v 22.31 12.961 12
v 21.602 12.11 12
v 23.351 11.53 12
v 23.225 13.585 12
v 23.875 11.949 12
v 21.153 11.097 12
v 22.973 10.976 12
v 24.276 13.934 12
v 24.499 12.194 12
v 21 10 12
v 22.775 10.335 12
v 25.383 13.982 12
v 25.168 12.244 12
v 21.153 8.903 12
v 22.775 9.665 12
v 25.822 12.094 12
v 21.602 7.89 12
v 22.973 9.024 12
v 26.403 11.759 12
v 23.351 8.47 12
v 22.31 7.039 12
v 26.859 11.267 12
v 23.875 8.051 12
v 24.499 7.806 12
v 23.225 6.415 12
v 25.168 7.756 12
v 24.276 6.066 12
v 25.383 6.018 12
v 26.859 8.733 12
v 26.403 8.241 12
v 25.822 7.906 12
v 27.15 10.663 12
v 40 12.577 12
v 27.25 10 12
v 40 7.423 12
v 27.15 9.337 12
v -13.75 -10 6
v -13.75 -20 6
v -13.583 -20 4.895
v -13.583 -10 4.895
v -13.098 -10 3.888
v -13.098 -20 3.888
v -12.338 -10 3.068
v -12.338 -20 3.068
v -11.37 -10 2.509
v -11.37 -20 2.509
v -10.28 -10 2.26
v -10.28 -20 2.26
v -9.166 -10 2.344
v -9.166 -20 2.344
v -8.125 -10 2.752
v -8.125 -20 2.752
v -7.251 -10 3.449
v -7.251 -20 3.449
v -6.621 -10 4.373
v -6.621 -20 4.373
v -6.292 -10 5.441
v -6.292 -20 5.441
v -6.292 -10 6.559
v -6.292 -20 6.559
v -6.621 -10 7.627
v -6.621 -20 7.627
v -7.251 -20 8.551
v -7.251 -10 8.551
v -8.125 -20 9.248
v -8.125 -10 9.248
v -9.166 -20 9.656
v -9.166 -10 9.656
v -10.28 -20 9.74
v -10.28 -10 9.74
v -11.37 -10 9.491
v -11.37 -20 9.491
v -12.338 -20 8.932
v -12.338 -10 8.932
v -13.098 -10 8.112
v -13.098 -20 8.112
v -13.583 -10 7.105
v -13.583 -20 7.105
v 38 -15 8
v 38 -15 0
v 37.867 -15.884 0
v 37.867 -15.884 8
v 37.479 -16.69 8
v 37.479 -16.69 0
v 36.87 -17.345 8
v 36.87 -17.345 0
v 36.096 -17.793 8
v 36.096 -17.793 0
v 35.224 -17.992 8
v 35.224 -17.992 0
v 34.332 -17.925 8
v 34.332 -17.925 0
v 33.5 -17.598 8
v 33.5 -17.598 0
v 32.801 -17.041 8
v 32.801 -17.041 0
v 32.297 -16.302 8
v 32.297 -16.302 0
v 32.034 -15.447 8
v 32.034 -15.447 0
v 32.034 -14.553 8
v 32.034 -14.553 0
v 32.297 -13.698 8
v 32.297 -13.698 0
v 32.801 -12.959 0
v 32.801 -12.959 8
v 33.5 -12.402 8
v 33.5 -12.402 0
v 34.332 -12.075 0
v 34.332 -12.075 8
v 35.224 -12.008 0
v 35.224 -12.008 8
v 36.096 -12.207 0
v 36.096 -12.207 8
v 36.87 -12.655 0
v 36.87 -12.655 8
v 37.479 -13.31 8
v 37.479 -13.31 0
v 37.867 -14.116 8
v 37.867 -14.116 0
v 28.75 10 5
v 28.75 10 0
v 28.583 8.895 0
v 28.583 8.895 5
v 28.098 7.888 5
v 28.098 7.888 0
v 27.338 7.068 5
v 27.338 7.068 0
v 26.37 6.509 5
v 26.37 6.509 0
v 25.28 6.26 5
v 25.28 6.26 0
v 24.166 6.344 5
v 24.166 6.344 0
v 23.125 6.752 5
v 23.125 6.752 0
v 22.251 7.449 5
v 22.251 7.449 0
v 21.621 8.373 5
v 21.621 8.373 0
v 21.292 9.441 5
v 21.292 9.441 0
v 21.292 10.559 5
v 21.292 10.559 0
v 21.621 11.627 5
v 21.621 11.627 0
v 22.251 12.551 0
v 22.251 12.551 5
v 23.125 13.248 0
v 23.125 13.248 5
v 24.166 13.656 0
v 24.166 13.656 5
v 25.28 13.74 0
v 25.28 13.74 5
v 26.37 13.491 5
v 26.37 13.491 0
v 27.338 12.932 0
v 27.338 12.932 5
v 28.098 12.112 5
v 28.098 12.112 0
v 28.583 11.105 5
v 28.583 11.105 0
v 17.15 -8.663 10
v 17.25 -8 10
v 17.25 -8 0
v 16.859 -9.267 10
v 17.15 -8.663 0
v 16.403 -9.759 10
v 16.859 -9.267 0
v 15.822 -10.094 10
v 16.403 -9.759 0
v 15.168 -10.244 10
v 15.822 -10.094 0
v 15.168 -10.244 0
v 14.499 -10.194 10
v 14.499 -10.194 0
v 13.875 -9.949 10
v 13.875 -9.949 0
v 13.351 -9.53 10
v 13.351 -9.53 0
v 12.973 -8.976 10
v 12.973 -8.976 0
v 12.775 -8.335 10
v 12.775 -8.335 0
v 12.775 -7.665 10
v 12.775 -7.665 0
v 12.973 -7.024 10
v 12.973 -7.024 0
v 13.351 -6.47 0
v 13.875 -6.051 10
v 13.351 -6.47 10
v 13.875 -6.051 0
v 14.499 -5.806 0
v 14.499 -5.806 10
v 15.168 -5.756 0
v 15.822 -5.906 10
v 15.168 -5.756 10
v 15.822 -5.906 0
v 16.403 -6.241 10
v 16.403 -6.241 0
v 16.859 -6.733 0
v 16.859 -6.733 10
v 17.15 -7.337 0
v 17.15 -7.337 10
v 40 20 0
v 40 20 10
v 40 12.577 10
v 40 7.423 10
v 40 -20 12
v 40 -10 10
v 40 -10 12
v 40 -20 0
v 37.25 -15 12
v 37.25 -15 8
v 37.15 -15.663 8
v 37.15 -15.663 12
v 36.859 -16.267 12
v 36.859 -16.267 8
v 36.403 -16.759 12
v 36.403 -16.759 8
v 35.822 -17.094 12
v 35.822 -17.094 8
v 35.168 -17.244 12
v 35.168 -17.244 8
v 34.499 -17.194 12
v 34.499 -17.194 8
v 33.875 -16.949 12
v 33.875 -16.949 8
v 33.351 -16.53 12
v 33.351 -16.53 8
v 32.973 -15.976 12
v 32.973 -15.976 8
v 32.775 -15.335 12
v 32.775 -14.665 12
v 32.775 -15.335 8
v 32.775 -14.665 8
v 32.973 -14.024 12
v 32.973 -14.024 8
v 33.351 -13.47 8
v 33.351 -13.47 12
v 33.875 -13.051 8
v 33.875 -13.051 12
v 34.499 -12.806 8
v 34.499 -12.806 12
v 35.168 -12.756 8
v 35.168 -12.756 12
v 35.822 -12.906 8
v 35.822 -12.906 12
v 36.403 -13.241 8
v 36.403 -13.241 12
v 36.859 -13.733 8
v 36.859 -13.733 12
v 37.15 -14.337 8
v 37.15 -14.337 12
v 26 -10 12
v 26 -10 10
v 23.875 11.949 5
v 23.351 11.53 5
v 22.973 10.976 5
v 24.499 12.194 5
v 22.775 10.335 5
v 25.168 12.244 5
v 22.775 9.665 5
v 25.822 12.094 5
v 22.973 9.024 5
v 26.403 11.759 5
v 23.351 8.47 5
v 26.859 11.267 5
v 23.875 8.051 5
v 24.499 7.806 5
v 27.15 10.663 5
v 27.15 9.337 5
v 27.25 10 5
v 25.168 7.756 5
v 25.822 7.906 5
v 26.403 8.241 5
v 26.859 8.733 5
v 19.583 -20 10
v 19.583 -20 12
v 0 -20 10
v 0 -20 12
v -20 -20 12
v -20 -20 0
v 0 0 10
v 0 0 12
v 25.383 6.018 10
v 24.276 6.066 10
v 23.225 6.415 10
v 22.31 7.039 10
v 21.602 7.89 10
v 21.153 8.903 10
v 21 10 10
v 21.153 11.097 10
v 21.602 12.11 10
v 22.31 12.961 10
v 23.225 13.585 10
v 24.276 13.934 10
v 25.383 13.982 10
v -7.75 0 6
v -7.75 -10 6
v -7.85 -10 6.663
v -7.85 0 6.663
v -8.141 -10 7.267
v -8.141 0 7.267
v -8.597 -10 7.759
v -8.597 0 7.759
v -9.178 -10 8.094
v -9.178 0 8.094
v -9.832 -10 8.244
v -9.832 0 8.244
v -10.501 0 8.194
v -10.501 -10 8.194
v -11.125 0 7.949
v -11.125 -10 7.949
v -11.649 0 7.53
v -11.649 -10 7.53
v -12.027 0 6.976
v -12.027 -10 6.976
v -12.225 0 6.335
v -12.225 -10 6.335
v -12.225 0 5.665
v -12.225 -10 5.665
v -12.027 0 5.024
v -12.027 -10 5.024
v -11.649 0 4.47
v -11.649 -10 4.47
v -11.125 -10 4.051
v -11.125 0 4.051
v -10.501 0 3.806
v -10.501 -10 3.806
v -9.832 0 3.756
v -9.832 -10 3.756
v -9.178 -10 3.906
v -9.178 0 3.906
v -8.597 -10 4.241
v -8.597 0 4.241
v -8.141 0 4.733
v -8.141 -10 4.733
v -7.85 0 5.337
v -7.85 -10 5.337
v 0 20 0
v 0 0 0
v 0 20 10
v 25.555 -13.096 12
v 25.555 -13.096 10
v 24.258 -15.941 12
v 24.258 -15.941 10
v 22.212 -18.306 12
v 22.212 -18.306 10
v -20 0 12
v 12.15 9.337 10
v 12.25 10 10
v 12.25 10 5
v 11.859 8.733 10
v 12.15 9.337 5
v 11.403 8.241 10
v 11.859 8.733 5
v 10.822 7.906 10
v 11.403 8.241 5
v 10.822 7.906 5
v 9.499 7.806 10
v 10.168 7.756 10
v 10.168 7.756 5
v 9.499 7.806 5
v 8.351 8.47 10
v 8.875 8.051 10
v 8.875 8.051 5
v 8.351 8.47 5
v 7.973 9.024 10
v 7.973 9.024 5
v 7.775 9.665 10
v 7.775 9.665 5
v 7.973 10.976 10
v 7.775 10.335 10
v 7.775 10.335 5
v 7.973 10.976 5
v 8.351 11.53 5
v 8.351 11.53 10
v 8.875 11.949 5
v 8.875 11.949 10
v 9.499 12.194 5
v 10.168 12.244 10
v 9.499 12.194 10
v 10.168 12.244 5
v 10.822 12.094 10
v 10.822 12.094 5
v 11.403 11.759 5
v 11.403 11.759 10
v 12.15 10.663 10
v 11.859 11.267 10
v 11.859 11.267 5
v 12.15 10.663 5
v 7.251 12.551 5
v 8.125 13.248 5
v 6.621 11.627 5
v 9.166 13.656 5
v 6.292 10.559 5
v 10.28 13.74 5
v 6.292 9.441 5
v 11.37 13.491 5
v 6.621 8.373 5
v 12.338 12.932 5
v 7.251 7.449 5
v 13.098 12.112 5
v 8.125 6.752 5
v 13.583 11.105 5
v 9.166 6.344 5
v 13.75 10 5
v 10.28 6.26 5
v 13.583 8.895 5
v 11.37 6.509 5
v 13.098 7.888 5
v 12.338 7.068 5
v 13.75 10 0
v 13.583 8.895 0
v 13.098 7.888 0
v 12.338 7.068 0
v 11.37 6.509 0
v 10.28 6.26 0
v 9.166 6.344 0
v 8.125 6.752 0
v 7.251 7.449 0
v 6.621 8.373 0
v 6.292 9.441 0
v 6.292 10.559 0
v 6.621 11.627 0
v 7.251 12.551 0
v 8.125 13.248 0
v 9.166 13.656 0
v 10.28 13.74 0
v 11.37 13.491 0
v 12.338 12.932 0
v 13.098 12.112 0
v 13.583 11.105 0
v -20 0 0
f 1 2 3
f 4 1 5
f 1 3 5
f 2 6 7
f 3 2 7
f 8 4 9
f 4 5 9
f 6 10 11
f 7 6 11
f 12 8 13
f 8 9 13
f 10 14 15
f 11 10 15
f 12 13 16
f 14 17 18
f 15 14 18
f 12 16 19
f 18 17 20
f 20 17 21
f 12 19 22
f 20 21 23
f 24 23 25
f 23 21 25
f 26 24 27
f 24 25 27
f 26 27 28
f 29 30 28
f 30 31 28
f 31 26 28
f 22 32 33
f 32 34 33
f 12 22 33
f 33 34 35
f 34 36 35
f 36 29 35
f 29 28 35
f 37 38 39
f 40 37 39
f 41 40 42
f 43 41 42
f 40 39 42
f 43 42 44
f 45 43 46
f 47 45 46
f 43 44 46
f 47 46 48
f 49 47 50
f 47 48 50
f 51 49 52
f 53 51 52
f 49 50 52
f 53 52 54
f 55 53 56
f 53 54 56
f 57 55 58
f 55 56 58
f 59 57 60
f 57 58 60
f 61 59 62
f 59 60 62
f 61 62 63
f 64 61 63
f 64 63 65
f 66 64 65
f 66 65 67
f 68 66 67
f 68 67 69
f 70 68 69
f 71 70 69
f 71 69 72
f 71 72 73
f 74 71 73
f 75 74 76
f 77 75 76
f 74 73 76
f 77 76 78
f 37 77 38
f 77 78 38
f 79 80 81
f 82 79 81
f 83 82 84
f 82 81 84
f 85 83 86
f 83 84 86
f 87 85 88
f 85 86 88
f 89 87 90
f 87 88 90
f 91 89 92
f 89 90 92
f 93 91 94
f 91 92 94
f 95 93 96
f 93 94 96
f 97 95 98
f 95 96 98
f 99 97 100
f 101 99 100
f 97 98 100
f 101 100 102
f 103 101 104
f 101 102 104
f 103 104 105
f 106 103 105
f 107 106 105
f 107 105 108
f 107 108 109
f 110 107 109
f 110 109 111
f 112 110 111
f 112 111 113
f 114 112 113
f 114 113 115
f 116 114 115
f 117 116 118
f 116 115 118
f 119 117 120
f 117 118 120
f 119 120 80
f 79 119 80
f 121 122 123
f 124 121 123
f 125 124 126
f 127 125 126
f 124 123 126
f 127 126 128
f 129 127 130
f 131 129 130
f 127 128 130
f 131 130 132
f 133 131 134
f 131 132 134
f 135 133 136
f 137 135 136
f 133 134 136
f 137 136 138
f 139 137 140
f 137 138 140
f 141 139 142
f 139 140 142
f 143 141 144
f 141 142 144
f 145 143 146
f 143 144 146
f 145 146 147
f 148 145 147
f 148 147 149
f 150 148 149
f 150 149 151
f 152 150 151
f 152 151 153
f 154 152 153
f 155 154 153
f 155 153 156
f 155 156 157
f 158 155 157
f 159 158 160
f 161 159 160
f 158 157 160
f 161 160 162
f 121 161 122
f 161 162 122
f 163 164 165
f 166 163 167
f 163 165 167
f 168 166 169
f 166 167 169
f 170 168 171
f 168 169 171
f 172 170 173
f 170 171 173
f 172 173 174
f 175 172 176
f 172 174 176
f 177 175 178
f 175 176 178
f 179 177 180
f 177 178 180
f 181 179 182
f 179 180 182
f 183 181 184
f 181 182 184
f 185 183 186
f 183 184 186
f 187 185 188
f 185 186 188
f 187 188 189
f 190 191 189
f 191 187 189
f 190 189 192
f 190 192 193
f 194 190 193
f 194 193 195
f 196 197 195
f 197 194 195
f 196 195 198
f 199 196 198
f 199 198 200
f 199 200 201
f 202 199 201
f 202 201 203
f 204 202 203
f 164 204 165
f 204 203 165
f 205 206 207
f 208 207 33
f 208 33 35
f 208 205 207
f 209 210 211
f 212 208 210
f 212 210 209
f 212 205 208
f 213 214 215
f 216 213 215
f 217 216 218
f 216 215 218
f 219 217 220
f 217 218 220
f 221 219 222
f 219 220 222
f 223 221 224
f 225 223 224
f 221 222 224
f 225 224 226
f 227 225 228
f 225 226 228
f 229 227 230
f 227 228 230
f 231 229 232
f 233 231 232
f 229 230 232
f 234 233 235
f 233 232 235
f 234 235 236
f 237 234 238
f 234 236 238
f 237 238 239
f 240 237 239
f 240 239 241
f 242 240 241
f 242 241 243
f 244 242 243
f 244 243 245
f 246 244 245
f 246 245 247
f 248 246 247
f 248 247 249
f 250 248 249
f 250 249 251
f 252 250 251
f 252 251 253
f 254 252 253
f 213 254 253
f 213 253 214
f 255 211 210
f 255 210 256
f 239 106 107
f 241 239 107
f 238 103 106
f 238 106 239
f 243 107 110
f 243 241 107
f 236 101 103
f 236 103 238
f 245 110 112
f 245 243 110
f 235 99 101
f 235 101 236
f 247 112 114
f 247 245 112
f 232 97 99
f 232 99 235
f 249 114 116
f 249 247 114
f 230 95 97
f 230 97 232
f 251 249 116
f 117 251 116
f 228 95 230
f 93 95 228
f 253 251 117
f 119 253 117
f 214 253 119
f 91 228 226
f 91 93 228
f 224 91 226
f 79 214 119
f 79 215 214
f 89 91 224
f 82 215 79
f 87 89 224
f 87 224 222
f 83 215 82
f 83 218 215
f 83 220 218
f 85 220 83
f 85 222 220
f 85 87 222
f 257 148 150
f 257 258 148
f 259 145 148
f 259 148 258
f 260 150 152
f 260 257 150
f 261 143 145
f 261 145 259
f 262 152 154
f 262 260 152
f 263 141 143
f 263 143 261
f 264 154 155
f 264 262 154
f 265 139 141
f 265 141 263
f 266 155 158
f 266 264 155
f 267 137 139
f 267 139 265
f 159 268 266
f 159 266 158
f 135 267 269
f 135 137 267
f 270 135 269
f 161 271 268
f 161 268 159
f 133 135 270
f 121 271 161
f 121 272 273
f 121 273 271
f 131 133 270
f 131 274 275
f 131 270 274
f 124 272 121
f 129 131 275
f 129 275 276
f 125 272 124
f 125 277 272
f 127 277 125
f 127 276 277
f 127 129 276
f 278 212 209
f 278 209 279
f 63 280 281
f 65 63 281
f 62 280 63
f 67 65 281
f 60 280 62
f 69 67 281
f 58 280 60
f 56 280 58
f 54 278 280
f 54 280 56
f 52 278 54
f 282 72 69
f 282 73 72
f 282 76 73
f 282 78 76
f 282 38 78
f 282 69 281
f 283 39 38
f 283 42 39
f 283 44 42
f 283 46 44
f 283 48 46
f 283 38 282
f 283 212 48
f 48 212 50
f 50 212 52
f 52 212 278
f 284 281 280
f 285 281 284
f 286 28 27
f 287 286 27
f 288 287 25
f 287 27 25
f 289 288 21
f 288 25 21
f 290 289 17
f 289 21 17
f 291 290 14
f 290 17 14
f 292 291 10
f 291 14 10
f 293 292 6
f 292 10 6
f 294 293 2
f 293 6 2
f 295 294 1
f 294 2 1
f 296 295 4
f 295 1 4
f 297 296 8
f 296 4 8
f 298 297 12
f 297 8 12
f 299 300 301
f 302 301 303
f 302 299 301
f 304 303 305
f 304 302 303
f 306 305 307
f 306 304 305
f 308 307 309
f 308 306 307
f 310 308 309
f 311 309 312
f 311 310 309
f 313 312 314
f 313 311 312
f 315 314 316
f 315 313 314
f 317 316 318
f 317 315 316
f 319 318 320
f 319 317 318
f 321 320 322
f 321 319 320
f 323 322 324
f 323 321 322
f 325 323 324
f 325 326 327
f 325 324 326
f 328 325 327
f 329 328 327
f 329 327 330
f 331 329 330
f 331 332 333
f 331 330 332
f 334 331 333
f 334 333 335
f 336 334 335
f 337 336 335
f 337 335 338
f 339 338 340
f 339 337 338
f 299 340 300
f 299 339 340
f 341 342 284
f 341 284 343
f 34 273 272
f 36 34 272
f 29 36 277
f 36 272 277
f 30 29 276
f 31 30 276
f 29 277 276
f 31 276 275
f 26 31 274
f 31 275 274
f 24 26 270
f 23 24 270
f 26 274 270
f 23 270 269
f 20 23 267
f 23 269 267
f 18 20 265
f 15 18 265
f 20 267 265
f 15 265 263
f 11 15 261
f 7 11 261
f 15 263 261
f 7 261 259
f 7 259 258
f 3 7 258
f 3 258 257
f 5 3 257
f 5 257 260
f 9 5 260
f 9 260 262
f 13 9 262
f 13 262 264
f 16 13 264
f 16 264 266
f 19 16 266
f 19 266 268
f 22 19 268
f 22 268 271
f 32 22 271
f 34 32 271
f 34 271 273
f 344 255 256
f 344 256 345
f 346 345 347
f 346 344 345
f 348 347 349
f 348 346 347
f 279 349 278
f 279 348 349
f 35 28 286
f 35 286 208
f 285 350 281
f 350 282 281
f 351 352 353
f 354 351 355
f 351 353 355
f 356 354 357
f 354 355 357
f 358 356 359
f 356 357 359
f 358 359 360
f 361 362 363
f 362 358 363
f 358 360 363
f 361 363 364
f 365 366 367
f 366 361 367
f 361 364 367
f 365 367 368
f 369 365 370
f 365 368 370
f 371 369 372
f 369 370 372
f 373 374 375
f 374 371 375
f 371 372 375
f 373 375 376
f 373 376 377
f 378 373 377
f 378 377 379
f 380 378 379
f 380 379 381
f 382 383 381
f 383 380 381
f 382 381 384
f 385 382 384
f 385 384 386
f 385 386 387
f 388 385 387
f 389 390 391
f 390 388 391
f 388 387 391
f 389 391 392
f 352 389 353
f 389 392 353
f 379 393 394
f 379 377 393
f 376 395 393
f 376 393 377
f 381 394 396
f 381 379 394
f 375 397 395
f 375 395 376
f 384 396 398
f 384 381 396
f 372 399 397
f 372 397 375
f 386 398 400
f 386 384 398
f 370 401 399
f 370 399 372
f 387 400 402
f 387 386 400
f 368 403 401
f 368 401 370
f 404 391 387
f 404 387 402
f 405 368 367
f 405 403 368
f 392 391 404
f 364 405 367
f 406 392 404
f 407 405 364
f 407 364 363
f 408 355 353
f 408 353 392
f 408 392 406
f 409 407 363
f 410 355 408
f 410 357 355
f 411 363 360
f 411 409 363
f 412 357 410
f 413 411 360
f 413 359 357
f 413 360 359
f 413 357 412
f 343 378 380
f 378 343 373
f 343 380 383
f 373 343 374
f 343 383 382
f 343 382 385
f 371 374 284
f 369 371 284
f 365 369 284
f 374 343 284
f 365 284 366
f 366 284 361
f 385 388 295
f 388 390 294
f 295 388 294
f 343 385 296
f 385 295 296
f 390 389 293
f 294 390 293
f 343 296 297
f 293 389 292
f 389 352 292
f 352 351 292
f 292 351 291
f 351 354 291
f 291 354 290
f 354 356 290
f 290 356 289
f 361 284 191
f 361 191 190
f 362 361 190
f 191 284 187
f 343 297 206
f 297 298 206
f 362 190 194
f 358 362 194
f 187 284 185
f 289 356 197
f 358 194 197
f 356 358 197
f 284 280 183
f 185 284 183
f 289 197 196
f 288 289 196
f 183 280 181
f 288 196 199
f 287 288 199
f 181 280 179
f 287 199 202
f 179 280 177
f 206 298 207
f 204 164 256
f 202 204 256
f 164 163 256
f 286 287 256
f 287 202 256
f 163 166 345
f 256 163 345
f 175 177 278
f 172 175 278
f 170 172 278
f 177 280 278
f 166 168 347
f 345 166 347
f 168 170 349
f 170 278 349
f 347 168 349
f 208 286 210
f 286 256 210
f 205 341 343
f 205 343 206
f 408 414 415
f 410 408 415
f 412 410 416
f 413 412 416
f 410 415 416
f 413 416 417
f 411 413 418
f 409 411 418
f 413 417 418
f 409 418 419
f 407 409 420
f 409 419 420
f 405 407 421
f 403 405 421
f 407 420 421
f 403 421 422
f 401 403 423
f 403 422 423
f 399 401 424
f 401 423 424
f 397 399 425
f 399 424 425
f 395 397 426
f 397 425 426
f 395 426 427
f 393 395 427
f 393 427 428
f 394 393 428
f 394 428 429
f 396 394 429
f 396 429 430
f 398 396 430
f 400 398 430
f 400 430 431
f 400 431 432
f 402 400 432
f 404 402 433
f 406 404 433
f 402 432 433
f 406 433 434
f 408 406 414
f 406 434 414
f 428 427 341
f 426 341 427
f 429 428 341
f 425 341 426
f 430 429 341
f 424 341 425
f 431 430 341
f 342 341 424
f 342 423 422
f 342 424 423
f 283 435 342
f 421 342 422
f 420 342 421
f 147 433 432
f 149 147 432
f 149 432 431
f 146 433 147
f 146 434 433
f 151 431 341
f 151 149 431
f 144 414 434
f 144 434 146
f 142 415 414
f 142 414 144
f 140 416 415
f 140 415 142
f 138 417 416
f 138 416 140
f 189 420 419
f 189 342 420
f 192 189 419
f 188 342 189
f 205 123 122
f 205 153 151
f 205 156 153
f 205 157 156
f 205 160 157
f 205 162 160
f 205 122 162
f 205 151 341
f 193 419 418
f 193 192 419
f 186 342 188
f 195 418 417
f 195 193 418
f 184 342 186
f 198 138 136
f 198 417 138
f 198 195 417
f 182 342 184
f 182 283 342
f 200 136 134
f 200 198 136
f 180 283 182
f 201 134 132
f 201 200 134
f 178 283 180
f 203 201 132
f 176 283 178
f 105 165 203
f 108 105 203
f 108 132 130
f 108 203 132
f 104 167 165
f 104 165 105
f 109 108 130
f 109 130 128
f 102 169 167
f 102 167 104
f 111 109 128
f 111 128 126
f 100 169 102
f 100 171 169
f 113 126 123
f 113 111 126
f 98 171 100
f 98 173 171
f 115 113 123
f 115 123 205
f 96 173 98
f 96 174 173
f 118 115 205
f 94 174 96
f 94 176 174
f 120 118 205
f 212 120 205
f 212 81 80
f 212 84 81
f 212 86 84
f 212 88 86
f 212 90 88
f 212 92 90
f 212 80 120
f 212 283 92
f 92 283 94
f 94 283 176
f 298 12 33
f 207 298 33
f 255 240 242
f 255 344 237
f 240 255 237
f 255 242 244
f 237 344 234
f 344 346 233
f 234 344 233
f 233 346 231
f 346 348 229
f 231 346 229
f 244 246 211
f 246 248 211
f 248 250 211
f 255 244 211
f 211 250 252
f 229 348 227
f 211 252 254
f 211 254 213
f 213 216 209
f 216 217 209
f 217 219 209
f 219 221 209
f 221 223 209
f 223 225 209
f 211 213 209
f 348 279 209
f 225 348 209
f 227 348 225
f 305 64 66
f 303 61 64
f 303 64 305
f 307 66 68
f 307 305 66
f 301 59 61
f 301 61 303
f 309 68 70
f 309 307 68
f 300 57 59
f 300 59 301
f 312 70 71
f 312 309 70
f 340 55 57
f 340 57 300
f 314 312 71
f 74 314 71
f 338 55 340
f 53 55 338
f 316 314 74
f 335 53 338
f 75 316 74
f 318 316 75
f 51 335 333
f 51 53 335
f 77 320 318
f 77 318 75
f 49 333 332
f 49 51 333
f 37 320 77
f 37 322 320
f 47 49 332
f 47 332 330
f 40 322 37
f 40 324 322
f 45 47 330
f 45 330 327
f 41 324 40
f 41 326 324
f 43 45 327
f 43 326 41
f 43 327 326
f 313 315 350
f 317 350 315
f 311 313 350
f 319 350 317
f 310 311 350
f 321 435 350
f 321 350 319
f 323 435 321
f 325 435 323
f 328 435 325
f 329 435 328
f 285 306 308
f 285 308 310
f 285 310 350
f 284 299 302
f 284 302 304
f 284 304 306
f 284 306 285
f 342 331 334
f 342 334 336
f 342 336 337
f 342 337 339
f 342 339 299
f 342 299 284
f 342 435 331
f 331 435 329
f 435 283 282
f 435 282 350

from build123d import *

# Parameters (mm, degrees)
SKETCH_R                       = 2.25
PAD_DEPTH                      = 12
POCKET_DEPTH                   = 2
SKETCH002_R                    = 2.25
POCKET002_DEPTH                = 20.001
PART_MIRRORING_PLACEMENT_ANGLE = 180
SKETCH003_R                    = 3.75
POCKET003_DEPTH                = 5
SKETCH004_R                    = 3.75
POCKET004_DEPTH                = 10
SKETCH005_R                    = 3
POCKET005_DEPTH                = 8


with BuildPart() as pocket002:
    # Sketch → Pad (new body)
    with BuildSketch(Plane.XY):
        Polygon((0, -20), (40, -20), (40, 20), (-20, 20), (-20, 0), (0, 0), align=None)
        with Locations((15, 8)):
            Circle(SKETCH_R, mode=Mode.SUBTRACT)
        with Locations((10, -10)):
            Circle(SKETCH_R, mode=Mode.SUBTRACT)
        with Locations((35, 15)):
            Circle(SKETCH_R, mode=Mode.SUBTRACT)
        with Locations((25, -10)):
            Circle(SKETCH_R, mode=Mode.SUBTRACT)
    extrude(amount=PAD_DEPTH)

    # Sketch001 → Pocket (cut)
    with BuildSketch(Plane.XY.offset(12)):
        with BuildLine():
            Line((46, 10), (26, 10))
            ThreePointArc((26, 10), (22.778175, 17.778175), (15, 21))
            Line((15, 21), (0, 21))
            Line((0, 21), (0, -23))
            Line((0, -23), (46, -23))
            Line((46, -23), (46, -12))
            Line((25.382674, -13.981653), (46, -12))
            ThreePointArc((25.382674, -6.018347), (21, -10), (25.382674, -13.981653))
            Line((25.382674, -6.018347), (46, -8))
            Line((46, -8), (46, 10))
        make_face()
    extrude(amount=-POCKET_DEPTH, mode=Mode.SUBTRACT)

    # Sketch002 → Pocket002 (cut, through all)
    with BuildSketch(Plane.XZ):
        with Locations((-10, 6)):
            Circle(SKETCH002_R)
    extrude(amount=-POCKET002_DEPTH, mode=Mode.SUBTRACT)


with BuildPart() as pocket005:
    # Part__Mirroring: instance of Pocket002
    add(pocket002.part.mirror(Plane(origin=(0, 0, 0), x_dir=(0, 1, 0), z_dir=(0, 0, 1))))


with BuildPart() as pocket005_1:
    # Part__Mirroring placement: moved
    add(pocket005.part.rotate(Axis((0, 0, 0), (1, 0, 0)), PART_MIRRORING_PLACEMENT_ANGLE))

    # Sketch003 → Pocket003 (cut)
    with BuildSketch(Plane(origin=(0, 0, 0), x_dir=(1, 0, 0), z_dir=(0, 0, -1))):
        with Locations((10, -10)):
            Circle(SKETCH003_R)
        with Locations((25, -10)):
            Circle(SKETCH003_R)
    extrude(amount=-POCKET003_DEPTH, mode=Mode.SUBTRACT)

    # Sketch004 → Pocket004 (cut)
    with BuildSketch(Plane(origin=(0, -20, 0), x_dir=(-1, 0, 0), z_dir=(0, -1, 0))):
        with Locations((10, -6)):
            Circle(SKETCH004_R)
    extrude(amount=-POCKET004_DEPTH, mode=Mode.SUBTRACT)

    # Sketch005 → Pocket005 (cut)
    with BuildSketch(Plane(origin=(0, 0, 0), x_dir=(1, 0, 0), z_dir=(0, 0, -1))):
        with Locations((35, 15)):
            Circle(SKETCH005_R)
    extrude(amount=-POCKET005_DEPTH, mode=Mode.SUBTRACT)


solid = pocket005_1.part
